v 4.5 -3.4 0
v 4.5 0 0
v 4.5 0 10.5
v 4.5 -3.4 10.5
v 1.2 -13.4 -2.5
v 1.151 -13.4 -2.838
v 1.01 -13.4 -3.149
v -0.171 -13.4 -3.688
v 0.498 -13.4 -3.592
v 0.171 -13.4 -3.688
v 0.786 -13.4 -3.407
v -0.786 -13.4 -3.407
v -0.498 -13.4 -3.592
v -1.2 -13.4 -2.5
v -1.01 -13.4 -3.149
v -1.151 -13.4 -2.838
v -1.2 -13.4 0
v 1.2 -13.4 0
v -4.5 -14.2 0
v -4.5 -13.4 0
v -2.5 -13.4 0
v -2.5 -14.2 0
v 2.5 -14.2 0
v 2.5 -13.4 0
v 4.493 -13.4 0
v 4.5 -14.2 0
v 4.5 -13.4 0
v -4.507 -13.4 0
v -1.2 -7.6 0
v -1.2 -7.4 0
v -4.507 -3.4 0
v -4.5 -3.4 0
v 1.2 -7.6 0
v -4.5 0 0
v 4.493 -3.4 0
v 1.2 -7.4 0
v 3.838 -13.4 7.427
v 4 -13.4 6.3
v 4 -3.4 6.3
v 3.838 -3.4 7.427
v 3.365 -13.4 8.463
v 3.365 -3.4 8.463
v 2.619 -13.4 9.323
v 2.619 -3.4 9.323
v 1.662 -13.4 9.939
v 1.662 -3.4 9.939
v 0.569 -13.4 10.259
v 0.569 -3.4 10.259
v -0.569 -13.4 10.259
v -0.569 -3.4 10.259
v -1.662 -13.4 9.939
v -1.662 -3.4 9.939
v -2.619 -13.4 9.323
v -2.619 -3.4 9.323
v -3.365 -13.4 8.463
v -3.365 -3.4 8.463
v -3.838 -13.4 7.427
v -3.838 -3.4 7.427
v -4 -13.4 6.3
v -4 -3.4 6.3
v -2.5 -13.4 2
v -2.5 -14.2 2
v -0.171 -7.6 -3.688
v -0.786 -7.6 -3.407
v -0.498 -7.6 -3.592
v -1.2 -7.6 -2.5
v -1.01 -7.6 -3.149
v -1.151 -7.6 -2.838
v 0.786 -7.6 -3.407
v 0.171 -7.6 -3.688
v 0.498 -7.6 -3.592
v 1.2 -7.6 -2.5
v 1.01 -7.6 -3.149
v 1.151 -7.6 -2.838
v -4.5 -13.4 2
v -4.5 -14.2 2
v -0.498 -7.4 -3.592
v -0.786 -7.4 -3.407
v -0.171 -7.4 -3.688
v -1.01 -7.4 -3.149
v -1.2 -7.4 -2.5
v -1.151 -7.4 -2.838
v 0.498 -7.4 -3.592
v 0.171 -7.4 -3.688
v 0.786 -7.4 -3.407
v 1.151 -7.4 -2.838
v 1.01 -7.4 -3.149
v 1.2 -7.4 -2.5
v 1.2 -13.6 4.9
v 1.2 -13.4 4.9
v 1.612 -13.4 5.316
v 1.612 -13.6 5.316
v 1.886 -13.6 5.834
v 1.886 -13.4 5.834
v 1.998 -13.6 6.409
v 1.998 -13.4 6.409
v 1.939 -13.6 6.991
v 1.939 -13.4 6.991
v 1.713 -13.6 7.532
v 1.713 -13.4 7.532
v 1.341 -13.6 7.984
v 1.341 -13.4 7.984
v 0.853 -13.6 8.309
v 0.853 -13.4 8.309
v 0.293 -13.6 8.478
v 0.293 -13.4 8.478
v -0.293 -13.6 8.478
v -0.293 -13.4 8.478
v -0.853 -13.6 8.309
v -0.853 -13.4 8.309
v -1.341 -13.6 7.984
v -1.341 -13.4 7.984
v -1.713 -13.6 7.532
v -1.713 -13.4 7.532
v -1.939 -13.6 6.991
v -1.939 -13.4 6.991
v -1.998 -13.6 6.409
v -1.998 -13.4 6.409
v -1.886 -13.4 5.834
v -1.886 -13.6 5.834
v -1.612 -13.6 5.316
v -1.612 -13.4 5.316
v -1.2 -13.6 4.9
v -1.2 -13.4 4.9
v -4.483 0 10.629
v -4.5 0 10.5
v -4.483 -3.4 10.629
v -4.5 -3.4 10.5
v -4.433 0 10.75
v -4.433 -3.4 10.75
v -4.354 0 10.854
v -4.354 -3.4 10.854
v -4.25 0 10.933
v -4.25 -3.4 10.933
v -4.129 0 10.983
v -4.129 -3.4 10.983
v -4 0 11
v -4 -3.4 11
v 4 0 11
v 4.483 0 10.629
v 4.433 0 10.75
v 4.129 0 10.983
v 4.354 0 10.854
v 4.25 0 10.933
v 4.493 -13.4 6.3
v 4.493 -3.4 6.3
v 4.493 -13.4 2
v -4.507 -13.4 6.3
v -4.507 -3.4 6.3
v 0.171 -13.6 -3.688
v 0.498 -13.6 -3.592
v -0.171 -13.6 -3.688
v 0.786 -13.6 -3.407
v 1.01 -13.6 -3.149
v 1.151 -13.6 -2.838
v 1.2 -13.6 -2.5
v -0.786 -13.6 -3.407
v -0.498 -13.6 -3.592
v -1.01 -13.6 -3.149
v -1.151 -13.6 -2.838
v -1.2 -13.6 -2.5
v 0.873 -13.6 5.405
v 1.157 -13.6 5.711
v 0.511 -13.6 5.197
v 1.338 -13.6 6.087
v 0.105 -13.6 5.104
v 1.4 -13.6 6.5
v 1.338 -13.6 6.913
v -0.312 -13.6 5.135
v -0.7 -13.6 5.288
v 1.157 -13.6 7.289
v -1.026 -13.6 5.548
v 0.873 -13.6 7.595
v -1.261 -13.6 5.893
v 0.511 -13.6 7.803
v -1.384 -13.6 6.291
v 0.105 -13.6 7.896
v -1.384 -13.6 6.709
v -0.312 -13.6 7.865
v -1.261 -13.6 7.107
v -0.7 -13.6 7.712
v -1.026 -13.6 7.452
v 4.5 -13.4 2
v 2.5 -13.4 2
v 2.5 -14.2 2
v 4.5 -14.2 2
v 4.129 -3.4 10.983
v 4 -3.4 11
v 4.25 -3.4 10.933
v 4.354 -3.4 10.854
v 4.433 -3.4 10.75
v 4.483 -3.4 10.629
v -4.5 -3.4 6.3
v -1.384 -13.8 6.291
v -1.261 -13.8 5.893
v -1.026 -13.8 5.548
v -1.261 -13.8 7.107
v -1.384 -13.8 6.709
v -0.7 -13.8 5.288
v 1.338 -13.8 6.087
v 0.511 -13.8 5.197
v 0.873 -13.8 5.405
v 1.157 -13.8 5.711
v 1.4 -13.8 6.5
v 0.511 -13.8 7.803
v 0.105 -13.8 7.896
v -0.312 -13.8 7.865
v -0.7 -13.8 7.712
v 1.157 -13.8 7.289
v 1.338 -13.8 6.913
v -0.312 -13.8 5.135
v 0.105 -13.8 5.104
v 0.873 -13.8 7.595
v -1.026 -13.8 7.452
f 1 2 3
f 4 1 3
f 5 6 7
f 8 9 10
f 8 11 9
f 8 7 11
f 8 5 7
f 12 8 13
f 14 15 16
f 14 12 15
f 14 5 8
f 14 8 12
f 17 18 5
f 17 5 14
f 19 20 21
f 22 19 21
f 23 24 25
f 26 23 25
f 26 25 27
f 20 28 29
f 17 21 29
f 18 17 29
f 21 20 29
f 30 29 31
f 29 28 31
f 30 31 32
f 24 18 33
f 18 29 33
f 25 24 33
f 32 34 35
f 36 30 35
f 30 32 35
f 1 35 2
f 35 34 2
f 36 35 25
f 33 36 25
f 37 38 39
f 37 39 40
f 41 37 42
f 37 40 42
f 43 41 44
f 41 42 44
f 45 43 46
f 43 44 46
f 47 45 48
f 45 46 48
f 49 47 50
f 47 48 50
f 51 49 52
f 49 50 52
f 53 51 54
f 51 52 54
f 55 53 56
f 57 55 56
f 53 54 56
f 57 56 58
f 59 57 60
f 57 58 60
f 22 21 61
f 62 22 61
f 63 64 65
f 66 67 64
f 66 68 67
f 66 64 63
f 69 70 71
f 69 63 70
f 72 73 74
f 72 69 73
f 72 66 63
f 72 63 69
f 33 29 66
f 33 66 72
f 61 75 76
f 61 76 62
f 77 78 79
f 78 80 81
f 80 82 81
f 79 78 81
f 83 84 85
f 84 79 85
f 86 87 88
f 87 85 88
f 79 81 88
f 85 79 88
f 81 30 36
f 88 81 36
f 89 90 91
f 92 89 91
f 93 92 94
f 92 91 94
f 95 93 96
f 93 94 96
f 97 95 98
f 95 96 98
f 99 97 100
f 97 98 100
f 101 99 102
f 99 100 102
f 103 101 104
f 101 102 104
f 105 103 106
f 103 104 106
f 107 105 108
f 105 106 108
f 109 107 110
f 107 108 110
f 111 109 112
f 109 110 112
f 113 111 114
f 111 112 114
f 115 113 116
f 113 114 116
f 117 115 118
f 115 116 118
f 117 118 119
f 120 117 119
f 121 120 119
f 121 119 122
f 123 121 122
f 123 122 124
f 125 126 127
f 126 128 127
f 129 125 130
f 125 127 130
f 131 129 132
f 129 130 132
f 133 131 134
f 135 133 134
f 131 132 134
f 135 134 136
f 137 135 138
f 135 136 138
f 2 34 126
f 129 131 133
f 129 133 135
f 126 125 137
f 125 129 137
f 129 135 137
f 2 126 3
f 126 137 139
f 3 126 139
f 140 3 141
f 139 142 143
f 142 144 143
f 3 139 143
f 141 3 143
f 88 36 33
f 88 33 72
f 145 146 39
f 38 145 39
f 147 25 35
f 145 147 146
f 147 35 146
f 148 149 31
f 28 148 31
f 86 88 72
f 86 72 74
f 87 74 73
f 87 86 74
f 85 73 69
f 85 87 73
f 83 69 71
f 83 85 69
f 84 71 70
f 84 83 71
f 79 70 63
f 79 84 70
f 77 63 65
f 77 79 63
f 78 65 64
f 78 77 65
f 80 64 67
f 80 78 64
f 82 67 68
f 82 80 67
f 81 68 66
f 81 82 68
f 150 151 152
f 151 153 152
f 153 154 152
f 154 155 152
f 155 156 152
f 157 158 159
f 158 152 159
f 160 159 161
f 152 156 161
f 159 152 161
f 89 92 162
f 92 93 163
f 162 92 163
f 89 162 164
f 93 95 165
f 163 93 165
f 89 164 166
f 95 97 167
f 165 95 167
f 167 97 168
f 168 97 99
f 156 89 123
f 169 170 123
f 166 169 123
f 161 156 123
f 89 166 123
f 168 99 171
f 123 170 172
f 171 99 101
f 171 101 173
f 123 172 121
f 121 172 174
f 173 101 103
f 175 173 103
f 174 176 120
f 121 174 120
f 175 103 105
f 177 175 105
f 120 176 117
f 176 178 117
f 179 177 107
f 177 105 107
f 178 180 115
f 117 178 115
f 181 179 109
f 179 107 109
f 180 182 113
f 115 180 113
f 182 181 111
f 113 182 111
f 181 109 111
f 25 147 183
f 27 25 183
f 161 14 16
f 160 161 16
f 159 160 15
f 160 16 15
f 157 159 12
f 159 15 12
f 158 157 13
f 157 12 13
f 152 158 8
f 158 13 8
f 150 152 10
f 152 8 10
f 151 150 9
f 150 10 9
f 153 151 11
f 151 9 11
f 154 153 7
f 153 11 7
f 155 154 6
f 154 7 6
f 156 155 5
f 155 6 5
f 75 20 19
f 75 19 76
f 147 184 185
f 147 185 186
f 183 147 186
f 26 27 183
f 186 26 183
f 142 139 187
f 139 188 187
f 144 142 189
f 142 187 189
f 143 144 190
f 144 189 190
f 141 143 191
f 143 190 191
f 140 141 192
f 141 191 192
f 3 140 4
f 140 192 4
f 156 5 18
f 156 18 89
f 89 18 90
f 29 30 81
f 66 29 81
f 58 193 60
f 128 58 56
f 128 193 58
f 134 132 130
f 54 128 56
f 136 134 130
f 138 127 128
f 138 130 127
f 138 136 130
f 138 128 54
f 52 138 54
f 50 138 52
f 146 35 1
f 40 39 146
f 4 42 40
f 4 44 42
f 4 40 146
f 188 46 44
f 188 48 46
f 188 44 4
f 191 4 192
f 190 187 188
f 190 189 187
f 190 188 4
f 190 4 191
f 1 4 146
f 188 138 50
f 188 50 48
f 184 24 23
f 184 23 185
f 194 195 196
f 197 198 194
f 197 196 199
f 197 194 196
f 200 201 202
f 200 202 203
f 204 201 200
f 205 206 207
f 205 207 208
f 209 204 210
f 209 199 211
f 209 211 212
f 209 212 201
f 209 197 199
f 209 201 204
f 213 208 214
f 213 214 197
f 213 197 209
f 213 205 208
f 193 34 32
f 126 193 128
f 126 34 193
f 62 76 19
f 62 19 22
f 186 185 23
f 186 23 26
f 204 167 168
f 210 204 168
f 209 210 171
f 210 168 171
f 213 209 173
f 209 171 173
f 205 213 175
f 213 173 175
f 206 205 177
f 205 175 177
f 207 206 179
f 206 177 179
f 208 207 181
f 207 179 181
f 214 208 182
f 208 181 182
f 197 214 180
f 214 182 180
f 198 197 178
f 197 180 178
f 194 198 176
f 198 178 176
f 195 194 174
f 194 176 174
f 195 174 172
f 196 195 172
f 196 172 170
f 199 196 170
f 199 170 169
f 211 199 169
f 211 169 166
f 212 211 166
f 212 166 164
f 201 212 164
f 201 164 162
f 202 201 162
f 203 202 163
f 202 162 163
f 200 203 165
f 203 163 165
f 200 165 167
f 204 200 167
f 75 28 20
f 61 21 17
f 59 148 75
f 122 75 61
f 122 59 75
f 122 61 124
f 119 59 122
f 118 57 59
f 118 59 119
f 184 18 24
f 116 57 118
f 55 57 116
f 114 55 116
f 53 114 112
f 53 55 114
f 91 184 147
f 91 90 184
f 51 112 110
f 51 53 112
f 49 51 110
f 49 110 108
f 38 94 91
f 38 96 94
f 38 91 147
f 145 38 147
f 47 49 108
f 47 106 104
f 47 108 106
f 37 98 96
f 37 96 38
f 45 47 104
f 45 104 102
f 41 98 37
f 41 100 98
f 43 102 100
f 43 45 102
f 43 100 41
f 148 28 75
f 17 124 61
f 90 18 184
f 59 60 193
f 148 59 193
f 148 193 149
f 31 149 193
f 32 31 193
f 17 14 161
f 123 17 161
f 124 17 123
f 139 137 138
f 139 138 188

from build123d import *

# Parameters (mm, degrees)
SKETCH_W     = 9
SKETCH_H     = 11
PAD_DEPTH    = 3.4
PAD001_DEPTH = 10
FILLET_R     = 0.5
SKETCH002_W  = 2
SKETCH002_H  = 2
PAD002_DEPTH = 0.8
PAD003_DEPTH = 0.2
SKETCH004_R  = 1.4
PAD004_DEPTH = 0.2
PAD005_DEPTH = 0.2


with BuildPart() as part:
    # Sketch → Pad (new body)
    with BuildSketch(Plane.XZ):
        with Locations((0, 5.5)):
            Rectangle(SKETCH_W, SKETCH_H)
    extrude(amount=PAD_DEPTH)

    # Sketch001 (on Face6 of Pad) → Pad001 (join)
    with BuildSketch(Plane.XZ.offset(3.4)):
        with BuildLine():
            ThreePointArc((4, 6.3), (0, 10.3), (-4, 6.3))
            Line((-4, 6.3), (-4.507423, 6.3))
            Line((-4.507423, 6.3), (-4.507423, 0))
            Line((-4.507423, 0), (4.492577, 0))
            Line((4.492577, 0), (4.492577, 6.3))
            Line((4.492577, 6.3), (4, 6.3))
        make_face()
    extrude(amount=PAD001_DEPTH)

    # Fillet
    fillet_edges = [part.edges().sort_by_distance(p)[0] for p in [
        (4.5, -1.7, 11),
        (-4.5, -1.7, 11),
    ]]
    fillet(fillet_edges, radius=FILLET_R)

    # Sketch002 (on Face16 of Fillet) → Pad002 (join)
    with BuildSketch(Plane.XZ.offset(13.4)):
        with Locations((3.5, 1)):
            Rectangle(SKETCH002_W, SKETCH002_H)
        with Locations((-3.5, 1)):
            Rectangle(SKETCH002_W, SKETCH002_H)
    extrude(amount=PAD002_DEPTH)

    # Sketch003 (on Face16 of Pad002) → Pad003 (join)
    with BuildSketch(Plane.XZ.offset(13.4)):
        with BuildLine():
            Line((-1.2, -2.5), (-1.2, 4.9))
            ThreePointArc((1.2, 4.9), (0, 8.5), (-1.2, 4.9))
            Line((1.2, -2.5), (1.2, 4.9))
            ThreePointArc((-1.2, -2.5), (0, -3.699991), (1.2, -2.5))
        make_face()
    extrude(amount=PAD003_DEPTH)

    # Sketch004 (on Face33 of Pad003) → Pad004 (join)
    with BuildSketch(Plane.XZ.offset(13.6)):
        with Locations((0, 6.5)):
            Circle(SKETCH004_R)
    extrude(amount=PAD004_DEPTH)

    # Sketch005 (on DatumPlane) → Pad005 (join)
    with BuildSketch(Plane(origin=(0, -7.4, 0), x_dir=(-1, 0, 0), z_dir=(0, 1, 0))):
        with BuildLine():
            Line((-1.2, 0), (1.2, 0))
            Line((1.2, 0), (1.2, -2.5))
            ThreePointArc((-1.2, -2.5), (0, -3.7), (1.2, -2.5))
            Line((-1.2, 0), (-1.2, -2.5))
        make_face()
    extrude(amount=-PAD005_DEPTH)


solid = part.part
